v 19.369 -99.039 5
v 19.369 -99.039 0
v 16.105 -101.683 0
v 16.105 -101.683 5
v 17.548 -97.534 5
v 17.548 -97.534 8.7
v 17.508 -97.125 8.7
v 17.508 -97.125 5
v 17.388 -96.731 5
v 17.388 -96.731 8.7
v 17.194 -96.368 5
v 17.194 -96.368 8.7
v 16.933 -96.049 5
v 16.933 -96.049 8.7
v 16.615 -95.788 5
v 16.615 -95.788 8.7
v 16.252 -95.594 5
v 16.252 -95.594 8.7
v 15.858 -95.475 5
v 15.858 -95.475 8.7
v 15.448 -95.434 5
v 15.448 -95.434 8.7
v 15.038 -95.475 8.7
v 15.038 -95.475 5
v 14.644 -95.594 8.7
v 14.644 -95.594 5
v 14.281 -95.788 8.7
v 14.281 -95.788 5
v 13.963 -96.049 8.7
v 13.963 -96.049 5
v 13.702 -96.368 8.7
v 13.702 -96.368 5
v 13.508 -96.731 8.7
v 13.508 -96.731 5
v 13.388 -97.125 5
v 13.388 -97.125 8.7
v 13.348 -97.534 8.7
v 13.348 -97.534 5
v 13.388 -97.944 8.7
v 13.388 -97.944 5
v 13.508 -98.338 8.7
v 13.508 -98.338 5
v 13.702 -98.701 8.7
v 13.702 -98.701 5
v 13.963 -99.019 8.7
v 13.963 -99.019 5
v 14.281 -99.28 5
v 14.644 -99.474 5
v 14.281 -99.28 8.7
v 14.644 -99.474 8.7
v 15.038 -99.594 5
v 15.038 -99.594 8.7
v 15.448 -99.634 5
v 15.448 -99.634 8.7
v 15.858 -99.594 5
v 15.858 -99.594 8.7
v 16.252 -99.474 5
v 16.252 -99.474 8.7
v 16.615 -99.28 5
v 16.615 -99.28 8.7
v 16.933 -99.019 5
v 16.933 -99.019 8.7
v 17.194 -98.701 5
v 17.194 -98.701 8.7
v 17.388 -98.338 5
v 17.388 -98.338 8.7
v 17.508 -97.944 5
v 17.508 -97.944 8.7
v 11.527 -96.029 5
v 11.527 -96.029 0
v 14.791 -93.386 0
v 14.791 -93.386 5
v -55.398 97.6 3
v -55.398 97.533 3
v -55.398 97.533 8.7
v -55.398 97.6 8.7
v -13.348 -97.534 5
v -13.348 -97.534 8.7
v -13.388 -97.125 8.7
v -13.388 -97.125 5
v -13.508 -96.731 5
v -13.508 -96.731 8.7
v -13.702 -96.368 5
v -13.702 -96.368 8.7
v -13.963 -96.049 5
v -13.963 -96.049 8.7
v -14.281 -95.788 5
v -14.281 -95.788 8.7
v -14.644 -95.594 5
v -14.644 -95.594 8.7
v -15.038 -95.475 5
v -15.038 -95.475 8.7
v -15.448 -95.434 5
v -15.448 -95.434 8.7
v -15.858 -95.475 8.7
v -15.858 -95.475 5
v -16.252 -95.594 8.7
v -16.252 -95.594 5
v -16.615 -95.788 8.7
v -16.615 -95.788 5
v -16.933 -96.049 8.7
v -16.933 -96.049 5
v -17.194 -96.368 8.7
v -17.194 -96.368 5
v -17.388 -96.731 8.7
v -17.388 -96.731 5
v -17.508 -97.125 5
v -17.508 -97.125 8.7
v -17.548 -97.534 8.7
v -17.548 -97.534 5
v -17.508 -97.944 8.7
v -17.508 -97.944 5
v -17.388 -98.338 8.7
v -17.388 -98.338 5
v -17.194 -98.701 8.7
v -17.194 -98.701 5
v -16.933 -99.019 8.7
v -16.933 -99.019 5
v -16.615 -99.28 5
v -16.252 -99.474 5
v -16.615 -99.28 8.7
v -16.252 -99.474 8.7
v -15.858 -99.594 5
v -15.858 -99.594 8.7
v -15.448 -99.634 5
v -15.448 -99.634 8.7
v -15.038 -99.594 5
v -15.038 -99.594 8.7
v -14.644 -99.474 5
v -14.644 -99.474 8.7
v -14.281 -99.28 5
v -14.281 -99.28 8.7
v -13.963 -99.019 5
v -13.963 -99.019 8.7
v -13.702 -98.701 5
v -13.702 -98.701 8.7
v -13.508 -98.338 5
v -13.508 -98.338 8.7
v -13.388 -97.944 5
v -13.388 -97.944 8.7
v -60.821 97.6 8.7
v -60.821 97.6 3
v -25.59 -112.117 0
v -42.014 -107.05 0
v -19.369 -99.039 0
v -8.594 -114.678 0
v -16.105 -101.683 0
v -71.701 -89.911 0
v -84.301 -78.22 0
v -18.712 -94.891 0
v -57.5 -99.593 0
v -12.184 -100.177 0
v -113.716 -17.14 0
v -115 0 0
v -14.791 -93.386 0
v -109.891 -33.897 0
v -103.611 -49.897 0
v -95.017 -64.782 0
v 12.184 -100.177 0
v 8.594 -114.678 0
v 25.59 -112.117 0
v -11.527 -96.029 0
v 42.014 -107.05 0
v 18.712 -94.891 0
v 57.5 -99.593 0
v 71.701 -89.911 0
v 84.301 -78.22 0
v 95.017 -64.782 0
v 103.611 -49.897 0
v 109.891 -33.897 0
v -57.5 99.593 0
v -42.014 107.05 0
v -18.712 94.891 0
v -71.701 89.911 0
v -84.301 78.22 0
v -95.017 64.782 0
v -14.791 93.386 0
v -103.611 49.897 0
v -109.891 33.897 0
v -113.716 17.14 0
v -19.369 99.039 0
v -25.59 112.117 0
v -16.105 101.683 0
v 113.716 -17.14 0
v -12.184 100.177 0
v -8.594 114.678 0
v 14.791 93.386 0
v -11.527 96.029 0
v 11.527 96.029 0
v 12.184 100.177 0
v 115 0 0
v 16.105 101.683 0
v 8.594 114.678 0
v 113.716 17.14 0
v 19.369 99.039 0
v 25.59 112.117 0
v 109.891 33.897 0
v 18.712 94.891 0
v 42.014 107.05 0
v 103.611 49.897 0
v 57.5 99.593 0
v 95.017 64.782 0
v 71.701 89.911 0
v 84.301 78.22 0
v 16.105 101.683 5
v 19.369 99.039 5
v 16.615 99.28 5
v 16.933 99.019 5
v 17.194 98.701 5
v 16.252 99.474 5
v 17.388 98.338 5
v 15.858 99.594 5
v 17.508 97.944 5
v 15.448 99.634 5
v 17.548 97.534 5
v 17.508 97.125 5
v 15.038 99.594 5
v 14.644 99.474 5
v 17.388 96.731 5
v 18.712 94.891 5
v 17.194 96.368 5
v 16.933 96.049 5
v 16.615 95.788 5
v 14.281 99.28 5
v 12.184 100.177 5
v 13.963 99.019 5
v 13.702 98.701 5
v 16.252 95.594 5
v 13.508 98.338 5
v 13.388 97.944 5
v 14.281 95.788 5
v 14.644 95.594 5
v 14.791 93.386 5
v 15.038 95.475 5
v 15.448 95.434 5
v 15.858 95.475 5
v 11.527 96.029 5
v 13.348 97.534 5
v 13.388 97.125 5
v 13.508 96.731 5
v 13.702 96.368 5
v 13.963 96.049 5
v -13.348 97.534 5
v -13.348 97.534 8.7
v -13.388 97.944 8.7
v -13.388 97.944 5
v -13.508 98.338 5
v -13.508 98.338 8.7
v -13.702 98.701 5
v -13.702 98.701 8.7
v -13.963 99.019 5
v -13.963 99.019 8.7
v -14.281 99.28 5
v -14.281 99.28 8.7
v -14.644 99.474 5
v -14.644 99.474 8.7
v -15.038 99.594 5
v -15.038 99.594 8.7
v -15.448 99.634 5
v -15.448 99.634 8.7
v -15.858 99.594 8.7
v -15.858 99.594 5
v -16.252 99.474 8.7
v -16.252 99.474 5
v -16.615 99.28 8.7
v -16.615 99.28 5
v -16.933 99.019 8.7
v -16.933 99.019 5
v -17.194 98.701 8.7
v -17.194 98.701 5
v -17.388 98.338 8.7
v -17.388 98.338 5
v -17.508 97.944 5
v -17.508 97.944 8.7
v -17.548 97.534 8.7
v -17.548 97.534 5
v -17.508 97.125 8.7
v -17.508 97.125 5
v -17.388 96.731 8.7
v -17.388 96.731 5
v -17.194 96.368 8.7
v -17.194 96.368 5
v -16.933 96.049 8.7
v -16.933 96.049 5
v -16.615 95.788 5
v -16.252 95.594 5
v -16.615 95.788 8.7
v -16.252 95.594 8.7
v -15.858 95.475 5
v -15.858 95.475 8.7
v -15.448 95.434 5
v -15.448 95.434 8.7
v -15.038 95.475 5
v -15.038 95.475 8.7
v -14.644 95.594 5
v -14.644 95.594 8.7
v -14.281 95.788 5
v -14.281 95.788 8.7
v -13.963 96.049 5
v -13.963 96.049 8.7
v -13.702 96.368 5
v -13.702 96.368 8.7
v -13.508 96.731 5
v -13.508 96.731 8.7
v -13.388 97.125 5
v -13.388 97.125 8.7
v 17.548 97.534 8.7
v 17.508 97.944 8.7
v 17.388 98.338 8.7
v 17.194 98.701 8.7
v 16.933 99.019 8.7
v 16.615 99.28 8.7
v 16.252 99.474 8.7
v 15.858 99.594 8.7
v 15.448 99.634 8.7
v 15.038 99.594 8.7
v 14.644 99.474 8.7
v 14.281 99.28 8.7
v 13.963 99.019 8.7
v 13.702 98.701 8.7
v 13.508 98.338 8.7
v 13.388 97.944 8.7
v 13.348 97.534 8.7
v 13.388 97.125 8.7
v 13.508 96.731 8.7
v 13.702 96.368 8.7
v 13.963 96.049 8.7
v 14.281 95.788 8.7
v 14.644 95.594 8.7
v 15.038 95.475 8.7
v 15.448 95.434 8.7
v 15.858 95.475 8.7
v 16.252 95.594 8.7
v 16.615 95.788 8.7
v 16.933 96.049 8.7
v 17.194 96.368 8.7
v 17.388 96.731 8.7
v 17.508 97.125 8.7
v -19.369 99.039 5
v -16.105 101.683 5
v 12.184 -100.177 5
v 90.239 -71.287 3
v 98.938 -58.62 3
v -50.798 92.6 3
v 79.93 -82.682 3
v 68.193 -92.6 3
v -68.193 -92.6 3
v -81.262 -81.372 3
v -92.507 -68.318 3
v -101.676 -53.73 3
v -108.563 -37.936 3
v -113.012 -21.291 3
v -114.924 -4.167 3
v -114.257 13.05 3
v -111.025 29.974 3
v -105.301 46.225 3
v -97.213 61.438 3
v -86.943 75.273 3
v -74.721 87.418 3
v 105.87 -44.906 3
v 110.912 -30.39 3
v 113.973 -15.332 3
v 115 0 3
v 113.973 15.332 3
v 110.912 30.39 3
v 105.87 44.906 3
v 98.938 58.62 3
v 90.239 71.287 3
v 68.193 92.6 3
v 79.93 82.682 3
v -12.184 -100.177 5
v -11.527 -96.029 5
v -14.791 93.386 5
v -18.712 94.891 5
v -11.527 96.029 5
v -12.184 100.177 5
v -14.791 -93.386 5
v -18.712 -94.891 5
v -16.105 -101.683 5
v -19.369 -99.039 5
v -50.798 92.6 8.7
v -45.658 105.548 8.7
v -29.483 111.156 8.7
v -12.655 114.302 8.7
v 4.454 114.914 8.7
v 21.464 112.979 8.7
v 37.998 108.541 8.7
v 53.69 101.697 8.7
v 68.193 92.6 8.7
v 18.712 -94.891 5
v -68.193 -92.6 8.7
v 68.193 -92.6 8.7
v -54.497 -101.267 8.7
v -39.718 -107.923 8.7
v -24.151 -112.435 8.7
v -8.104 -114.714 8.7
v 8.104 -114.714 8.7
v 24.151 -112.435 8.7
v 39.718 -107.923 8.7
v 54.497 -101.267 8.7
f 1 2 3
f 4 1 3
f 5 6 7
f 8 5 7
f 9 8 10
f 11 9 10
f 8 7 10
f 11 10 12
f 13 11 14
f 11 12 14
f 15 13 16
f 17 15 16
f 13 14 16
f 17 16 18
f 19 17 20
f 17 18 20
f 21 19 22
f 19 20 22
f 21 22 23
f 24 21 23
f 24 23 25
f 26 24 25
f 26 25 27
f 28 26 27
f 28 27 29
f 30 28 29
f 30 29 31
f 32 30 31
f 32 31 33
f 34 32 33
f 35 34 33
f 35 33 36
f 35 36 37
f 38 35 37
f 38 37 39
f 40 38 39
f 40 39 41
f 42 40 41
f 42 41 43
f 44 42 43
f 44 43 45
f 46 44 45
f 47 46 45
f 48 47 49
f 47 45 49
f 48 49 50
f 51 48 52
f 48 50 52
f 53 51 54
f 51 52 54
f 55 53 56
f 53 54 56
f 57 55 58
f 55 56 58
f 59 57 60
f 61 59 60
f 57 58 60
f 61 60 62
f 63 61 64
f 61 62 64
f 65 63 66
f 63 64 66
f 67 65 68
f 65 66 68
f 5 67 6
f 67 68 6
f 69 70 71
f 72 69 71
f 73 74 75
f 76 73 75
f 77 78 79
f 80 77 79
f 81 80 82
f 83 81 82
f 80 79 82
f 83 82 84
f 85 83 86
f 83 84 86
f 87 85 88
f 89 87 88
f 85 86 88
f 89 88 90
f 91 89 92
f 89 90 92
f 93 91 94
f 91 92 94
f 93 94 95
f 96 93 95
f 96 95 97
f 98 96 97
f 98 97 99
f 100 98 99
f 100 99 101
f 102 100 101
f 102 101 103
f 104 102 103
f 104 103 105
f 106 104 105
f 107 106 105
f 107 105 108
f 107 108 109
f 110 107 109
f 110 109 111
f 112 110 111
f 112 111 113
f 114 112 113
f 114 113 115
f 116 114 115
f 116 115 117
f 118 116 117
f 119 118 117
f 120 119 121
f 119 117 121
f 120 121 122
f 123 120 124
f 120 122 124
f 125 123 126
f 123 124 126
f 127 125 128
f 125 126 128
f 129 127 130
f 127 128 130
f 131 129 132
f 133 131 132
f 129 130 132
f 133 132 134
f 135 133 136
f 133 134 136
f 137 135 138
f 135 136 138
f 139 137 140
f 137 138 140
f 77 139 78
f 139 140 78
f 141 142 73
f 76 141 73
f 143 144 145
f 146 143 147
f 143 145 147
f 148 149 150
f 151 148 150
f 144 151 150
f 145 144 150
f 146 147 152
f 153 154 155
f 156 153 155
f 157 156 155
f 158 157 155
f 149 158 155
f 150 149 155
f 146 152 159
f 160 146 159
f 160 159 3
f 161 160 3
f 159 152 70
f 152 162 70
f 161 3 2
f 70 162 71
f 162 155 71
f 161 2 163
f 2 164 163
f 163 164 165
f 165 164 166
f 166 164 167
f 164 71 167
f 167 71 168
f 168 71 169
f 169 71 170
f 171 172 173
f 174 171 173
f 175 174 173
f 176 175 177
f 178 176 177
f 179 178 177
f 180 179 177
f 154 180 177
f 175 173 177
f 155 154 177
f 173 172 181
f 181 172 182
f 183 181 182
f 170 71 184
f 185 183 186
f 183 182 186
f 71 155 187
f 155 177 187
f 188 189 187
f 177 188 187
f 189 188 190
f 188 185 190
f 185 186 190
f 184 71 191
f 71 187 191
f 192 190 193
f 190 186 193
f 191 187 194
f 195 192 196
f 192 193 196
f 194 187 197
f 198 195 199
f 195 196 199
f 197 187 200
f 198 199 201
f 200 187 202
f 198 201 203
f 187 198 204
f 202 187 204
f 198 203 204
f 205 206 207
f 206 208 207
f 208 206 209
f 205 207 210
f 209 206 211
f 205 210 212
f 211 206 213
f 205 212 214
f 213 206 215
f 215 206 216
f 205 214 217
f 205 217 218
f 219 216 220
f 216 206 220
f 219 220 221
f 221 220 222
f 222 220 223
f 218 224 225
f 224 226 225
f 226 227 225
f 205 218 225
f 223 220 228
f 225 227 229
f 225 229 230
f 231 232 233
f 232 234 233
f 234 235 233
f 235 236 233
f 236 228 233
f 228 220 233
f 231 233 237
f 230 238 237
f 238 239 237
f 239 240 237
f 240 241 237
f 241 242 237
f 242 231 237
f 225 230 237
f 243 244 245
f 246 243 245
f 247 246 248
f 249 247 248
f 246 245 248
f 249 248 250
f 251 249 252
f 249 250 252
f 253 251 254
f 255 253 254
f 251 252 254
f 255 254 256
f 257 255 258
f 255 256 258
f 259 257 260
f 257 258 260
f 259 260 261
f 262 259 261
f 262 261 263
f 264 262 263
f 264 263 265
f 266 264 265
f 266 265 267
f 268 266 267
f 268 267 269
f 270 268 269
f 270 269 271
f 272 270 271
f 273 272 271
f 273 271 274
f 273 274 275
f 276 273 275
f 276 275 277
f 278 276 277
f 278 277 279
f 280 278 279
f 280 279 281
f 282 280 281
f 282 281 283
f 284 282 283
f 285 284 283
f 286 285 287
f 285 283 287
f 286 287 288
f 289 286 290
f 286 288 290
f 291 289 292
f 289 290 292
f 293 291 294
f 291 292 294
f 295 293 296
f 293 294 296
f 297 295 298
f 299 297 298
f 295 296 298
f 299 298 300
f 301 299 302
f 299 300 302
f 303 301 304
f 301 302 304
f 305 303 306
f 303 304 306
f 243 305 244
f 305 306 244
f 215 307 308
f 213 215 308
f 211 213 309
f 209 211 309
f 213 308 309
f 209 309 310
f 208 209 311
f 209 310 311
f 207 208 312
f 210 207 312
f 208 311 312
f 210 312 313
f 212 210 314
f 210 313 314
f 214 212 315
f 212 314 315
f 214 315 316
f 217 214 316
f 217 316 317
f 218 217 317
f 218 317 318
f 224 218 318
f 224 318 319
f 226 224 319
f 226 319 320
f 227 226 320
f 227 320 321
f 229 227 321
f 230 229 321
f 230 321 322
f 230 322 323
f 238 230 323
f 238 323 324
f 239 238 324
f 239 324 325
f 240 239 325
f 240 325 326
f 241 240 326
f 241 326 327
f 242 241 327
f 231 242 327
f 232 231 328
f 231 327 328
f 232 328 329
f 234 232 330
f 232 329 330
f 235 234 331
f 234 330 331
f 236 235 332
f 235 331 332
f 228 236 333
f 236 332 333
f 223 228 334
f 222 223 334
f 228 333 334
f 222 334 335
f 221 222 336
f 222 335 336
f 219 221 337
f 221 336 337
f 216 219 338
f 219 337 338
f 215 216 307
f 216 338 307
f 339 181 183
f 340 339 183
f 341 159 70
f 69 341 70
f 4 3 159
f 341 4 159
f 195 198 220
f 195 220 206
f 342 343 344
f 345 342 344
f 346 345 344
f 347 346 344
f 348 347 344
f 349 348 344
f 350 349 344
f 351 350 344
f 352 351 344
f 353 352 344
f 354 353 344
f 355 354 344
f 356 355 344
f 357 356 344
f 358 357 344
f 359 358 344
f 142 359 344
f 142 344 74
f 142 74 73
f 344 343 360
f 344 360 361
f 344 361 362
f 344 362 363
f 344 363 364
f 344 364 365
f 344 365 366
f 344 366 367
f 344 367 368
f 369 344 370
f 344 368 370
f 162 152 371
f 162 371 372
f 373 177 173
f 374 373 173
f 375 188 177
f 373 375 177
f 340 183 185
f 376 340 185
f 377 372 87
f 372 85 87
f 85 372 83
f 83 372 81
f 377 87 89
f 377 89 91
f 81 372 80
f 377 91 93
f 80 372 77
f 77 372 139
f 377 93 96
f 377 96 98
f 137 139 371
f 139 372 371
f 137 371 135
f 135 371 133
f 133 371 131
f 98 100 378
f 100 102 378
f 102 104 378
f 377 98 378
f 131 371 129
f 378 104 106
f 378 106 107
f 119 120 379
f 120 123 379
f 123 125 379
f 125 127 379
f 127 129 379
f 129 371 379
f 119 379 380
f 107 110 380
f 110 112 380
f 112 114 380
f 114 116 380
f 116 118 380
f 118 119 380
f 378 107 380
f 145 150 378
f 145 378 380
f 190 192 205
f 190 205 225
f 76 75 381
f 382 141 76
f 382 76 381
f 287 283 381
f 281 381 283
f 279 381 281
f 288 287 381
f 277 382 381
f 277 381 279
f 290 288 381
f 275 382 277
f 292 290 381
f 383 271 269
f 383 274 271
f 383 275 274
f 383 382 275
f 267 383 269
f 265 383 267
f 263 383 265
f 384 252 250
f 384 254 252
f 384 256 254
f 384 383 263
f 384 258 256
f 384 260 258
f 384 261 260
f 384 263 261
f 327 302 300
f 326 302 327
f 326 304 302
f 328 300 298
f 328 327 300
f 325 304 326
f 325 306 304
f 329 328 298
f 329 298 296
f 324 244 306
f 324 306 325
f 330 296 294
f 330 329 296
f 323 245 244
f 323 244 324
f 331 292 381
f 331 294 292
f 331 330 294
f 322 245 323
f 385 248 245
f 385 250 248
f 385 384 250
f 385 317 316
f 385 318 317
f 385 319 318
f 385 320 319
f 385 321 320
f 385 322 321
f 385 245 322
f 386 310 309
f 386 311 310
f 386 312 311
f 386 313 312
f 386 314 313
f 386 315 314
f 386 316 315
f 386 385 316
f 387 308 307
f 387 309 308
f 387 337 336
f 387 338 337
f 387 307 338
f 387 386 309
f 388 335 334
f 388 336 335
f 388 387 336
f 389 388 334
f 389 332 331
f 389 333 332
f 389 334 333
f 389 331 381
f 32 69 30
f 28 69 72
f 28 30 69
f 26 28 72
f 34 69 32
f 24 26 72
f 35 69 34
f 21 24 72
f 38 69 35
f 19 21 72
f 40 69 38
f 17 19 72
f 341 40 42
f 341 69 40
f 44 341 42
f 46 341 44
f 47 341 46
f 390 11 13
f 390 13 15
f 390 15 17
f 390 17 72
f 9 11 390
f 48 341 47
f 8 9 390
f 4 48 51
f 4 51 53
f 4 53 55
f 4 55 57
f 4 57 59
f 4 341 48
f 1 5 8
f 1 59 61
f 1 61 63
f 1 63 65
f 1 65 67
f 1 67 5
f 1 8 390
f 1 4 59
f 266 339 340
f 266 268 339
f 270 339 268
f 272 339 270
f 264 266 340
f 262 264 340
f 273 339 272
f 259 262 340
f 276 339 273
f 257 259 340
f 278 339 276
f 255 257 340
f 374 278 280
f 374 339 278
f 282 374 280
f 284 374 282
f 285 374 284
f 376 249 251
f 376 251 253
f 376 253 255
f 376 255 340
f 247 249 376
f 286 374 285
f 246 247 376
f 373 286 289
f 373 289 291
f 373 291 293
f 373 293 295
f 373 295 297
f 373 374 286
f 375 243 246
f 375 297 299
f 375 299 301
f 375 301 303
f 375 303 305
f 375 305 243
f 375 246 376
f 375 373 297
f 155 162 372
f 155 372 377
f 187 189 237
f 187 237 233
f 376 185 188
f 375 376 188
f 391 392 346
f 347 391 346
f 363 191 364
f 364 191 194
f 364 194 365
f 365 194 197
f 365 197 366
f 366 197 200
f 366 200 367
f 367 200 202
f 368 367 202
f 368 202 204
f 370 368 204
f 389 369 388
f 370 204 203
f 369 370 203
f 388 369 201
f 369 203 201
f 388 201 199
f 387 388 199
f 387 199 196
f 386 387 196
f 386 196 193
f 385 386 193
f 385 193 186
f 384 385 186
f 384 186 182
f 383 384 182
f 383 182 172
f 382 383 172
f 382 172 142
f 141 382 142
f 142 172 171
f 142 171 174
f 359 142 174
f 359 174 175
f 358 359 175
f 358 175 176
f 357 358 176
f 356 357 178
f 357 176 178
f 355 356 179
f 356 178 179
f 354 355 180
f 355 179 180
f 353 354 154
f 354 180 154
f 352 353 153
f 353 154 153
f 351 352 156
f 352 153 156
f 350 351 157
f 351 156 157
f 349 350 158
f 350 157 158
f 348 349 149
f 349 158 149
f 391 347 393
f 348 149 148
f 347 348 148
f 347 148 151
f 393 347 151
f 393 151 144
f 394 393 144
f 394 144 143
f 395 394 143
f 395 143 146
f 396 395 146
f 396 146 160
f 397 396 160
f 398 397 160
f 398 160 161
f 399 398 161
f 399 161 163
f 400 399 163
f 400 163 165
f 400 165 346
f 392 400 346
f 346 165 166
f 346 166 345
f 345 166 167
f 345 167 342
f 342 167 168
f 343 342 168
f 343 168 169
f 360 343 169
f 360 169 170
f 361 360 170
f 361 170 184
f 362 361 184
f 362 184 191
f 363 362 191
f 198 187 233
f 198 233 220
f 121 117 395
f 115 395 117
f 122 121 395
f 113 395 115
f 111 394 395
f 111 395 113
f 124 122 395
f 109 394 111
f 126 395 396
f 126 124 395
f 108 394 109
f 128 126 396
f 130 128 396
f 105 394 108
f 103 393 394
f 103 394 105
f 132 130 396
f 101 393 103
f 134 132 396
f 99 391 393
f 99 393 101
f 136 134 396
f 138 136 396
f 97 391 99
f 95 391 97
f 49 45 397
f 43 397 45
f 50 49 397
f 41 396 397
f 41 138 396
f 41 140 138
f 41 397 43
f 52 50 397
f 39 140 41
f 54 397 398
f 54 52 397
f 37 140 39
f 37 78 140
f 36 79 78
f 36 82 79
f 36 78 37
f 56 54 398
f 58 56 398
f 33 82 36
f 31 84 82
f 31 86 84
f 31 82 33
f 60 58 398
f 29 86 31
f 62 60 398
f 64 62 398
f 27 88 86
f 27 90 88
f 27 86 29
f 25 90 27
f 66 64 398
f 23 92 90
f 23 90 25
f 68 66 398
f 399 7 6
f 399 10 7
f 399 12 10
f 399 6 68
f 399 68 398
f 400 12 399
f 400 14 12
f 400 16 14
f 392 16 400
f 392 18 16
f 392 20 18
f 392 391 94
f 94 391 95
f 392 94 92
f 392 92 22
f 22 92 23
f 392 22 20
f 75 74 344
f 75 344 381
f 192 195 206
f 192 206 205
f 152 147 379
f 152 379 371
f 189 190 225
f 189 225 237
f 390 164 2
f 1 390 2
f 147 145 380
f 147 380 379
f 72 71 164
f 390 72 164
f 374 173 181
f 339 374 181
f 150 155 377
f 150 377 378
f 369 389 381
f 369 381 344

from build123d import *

# Parameters (mm, degrees)
SKETCH002_R      = 115
PAD001_DEPTH     = 8.7
SKETCH005_W      = 5.7
SKETCH005_H      = 185.2
POCKET_DEPTH     = 257
SKETCH016_W      = 13
SKETCH016_H      = 6
POCKET004_DEPTH  = 5
CHAMFER001_ANGLE = 47
CHAMFER001_SIZE  = 4.6
SKETCH018_R      = 2.1
POCKET005_DEPTH  = 10
SKETCH019_R      = 2.1
POCKET006_DEPTH  = 10
POCKET007_DEPTH  = 5


with BuildPart() as part:
    # Sketch002 → Pad001 (new body)
    with BuildSketch(Plane.XY):
        Circle(SKETCH002_R)
    extrude(amount=PAD001_DEPTH)

    # Sketch005 (on DatumPlane) → Pocket (cut)
    with BuildSketch(Plane(origin=(115, 0, 4.35), x_dir=(0, 0, -1), z_dir=(1, 0, 0))):
        with Locations((-1.5, 0)):
            Rectangle(SKETCH005_W, SKETCH005_H)
    extrude(amount=-POCKET_DEPTH, mode=Mode.SUBTRACT)

    # Sketch016 (on Face6 of Pocket) → Pocket004 (cut)
    with BuildSketch(Plane.XZ.offset(-92.6)):
        with Locations((-61.897977, 6)):
            Rectangle(SKETCH016_W, SKETCH016_H)
    extrude(amount=-POCKET004_DEPTH, mode=Mode.SUBTRACT)

    # Chamfer001
    chamfer001_edges = [part.edges().sort_by_distance(p)[0] for p in [
        (-55.397977, 92.6, 5.85),
    ]]
    chamfer001_side = part.faces().sort_by_distance((6.397346, 92.6, 5.85))[0]
    chamfer(chamfer001_edges, length=CHAMFER001_SIZE, angle=CHAMFER001_ANGLE, reference=chamfer001_side)

    # Sketch018 (on Face1 of Chamfer001) → Pocket005 (cut)
    with BuildSketch(Plane.XY.offset(8.7)):
        with Locations((15.447874, 97.534228)):
            Circle(SKETCH018_R)
        with Locations((-15.447903, 97.534224)):
            Circle(SKETCH018_R)
    extrude(amount=-POCKET005_DEPTH, mode=Mode.SUBTRACT)

    # Sketch019 (on Face11 of Pocket005) → Pocket006 (cut)
    with BuildSketch(Plane.XY.offset(8.7)):
        with Locations((-15.447907, -97.534223)):
            Circle(SKETCH019_R)
        with Locations((15.447907, -97.534223)):
            Circle(SKETCH019_R)
    extrude(amount=-POCKET006_DEPTH, mode=Mode.SUBTRACT)

    # Sketch020 (on Face12 of Pocket006) → Pocket007 (cut)
    with BuildSketch(Plane(origin=(0, 0, 0), x_dir=(1, 0, 0), z_dir=(0, 0, -1))):
        Polygon((14.79085, 93.385937), (18.711887, 94.891084), (19.368911, 99.039375), (16.104897, 101.68252), (12.18386, 100.177373), (11.526836, 96.029082), align=None)
        Polygon((14.790851, -93.385937), (18.711888, -94.891084), (19.368912, -99.039375), (16.104898, -101.682519), (12.183861, -100.177373), (11.526837, -96.029082), align=None)
        Polygon((-14.79085, 93.385937), (-18.711887, 94.891084), (-19.368911, 99.039375), (-16.104897, 101.68252), (-12.18386, 100.177373), (-11.526836, 96.029082), align=None)
        Polygon((-14.790851, -93.385937), (-18.711888, -94.891084), (-19.368912, -99.039375), (-16.104898, -101.682519), (-12.183861, -100.177373), (-11.526837, -96.029082), align=None)
    extrude(amount=-POCKET007_DEPTH, mode=Mode.SUBTRACT)


solid = part.part
